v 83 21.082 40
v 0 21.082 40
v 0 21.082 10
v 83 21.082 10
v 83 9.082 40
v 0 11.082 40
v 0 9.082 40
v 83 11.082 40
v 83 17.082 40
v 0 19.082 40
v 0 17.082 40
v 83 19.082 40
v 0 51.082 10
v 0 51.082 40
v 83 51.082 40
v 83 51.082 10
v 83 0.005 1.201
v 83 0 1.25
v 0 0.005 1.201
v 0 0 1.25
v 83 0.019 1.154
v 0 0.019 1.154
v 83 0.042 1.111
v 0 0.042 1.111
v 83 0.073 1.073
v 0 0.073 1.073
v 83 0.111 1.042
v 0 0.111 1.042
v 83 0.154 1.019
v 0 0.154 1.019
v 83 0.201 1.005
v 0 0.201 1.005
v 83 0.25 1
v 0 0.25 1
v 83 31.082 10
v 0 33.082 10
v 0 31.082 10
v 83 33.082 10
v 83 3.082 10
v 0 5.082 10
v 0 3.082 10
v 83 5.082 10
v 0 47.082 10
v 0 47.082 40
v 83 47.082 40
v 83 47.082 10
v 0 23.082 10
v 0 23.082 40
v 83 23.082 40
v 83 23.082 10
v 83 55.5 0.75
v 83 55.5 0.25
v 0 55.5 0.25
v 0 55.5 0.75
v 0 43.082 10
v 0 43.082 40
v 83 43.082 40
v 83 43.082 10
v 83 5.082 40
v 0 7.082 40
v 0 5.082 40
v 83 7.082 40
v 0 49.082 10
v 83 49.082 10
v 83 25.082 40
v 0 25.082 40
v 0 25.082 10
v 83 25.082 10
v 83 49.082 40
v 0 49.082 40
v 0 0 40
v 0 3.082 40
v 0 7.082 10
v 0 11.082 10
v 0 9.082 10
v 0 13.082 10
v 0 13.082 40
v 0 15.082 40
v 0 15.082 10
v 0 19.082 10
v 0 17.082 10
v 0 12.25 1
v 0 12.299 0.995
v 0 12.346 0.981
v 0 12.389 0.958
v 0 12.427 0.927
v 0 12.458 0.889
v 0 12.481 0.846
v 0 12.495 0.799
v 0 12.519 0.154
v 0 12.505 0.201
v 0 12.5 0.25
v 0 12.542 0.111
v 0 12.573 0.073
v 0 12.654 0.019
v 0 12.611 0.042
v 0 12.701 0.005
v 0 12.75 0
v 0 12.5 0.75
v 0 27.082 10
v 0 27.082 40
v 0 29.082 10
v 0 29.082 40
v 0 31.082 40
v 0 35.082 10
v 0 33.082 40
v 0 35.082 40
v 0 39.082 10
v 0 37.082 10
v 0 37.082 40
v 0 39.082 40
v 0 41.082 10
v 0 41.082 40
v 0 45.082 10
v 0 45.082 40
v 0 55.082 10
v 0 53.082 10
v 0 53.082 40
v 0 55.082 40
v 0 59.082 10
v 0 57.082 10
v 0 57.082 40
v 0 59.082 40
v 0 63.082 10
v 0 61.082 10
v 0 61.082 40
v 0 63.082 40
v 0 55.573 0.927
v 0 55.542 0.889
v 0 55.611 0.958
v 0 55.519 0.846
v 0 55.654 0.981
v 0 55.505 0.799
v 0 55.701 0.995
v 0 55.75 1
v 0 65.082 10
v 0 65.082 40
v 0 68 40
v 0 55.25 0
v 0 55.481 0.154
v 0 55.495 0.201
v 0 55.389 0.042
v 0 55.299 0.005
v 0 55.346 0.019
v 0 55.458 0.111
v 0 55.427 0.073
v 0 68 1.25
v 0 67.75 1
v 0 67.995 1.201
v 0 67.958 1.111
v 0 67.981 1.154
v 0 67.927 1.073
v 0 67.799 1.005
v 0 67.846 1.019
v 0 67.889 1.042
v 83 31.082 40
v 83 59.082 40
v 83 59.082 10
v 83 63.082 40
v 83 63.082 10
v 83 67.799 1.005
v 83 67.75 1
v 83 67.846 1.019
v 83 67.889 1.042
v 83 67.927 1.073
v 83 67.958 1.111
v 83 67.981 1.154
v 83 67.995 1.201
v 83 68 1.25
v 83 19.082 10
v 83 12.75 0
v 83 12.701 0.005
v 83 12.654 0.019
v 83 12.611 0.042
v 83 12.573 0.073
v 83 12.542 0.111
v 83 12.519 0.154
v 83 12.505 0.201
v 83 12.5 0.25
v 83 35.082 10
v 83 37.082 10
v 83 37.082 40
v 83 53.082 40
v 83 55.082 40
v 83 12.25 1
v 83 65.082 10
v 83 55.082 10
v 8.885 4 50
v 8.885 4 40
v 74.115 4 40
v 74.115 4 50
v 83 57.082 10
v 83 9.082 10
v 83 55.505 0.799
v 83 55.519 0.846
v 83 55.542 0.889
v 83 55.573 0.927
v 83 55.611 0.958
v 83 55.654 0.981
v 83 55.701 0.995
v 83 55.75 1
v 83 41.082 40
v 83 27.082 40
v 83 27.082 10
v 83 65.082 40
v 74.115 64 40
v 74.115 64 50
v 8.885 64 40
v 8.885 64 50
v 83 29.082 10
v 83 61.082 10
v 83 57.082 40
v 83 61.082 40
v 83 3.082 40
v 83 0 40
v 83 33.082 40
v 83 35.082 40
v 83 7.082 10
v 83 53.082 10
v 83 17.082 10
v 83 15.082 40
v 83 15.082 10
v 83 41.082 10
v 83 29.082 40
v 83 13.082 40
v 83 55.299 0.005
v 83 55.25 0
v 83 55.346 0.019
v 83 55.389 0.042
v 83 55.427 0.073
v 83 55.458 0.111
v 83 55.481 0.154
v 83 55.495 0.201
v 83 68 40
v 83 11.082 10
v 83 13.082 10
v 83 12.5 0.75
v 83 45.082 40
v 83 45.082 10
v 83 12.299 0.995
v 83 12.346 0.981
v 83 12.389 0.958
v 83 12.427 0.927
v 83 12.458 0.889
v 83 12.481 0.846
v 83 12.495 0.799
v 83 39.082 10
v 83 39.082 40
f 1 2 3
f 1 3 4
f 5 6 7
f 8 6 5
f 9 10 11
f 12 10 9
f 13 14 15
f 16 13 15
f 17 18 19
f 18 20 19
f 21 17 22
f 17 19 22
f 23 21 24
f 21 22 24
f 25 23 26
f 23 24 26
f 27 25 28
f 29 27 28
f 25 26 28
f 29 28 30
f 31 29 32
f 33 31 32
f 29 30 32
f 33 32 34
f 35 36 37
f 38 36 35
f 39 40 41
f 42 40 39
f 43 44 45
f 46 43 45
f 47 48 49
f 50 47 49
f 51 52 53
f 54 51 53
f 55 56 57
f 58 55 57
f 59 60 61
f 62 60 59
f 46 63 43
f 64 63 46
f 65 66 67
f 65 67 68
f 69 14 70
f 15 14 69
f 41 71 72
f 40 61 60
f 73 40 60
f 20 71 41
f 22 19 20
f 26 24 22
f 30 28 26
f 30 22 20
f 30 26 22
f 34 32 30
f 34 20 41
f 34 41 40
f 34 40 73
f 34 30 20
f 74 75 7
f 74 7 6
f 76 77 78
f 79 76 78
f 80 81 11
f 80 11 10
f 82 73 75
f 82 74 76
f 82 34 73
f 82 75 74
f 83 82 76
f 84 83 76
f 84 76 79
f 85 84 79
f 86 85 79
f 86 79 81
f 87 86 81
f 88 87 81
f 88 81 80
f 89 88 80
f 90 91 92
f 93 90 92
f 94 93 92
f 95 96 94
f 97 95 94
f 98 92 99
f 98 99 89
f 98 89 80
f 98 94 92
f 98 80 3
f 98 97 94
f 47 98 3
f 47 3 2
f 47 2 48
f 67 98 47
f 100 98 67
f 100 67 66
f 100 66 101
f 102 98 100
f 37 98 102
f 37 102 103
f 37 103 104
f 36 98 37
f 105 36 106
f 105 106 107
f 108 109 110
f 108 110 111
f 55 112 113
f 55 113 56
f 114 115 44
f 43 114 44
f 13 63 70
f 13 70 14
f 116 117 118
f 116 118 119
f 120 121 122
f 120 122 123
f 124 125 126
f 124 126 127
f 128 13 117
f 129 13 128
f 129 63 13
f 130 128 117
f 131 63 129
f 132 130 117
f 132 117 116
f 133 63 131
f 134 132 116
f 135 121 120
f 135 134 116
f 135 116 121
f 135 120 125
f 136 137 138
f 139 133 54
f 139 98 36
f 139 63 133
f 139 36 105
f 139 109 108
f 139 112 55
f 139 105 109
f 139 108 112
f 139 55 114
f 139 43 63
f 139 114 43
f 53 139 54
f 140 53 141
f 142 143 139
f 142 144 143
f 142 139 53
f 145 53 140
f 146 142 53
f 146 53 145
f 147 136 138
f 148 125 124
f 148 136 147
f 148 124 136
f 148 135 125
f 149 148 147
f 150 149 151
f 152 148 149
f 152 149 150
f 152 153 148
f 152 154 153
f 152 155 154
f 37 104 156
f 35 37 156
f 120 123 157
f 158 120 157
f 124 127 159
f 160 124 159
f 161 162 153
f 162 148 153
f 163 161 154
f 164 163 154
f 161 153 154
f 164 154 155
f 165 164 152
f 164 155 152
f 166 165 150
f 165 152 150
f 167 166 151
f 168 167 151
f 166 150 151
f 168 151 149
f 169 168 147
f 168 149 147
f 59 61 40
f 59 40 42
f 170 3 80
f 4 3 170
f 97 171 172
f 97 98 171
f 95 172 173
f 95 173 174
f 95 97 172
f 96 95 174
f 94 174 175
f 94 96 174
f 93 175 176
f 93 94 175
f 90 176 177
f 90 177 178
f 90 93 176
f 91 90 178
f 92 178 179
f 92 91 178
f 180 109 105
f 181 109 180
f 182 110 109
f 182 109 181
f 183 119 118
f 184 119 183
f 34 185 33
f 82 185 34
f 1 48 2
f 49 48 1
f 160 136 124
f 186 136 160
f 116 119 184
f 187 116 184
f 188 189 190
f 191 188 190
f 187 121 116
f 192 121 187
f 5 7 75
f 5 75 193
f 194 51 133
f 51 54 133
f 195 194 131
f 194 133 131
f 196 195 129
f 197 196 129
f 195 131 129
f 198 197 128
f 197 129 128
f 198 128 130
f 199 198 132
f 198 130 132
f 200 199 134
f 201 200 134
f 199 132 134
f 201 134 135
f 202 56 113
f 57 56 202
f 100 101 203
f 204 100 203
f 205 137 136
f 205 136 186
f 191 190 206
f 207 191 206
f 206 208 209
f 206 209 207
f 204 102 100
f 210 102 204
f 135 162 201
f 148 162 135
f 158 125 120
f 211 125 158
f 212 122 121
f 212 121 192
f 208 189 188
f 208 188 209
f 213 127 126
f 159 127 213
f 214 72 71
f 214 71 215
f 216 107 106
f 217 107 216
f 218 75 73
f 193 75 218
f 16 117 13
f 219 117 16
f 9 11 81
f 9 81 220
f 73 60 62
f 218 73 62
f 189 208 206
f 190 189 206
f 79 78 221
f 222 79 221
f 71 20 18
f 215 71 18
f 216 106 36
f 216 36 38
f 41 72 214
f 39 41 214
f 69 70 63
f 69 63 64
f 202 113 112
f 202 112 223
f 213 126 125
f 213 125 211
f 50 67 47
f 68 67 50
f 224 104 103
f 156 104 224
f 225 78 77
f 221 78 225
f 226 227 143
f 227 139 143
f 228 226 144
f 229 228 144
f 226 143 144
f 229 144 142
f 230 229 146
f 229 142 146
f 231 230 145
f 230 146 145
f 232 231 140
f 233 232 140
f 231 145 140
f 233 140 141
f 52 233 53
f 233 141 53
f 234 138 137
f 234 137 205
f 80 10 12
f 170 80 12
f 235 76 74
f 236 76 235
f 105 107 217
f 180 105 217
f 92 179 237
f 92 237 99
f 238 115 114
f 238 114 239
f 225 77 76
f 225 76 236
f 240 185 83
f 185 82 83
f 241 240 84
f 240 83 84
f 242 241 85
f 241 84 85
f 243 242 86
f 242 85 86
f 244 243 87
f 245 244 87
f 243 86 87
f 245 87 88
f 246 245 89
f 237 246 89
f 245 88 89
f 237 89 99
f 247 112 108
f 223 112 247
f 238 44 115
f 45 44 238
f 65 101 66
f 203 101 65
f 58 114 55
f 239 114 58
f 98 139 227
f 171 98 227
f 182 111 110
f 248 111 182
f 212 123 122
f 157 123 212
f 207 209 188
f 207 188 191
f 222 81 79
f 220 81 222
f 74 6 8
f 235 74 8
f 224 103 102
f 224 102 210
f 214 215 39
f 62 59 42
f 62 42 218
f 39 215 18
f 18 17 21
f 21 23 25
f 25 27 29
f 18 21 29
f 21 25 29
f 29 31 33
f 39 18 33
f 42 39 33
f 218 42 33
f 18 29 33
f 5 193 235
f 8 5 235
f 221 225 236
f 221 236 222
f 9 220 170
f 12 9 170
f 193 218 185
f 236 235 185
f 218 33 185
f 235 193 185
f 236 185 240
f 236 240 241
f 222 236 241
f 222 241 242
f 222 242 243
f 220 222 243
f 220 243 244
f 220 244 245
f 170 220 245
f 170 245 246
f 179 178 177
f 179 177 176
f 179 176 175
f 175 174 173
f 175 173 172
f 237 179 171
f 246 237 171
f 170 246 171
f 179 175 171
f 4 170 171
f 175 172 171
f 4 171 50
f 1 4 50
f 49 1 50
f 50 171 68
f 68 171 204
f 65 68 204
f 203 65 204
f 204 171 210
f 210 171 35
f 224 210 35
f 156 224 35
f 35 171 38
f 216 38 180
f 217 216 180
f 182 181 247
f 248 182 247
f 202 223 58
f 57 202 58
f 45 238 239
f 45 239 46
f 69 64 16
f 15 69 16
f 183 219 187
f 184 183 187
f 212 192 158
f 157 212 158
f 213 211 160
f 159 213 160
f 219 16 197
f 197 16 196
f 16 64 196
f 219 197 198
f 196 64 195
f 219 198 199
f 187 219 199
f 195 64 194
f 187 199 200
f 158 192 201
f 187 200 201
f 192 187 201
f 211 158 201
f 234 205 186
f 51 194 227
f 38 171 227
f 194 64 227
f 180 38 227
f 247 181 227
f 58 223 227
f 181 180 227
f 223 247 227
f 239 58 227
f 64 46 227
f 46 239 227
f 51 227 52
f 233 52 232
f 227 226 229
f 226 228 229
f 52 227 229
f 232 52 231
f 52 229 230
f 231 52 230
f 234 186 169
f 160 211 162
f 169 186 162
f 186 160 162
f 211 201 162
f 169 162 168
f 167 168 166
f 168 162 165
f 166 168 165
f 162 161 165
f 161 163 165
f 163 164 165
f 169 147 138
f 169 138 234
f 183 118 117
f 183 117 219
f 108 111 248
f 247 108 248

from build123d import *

# Parameters (mm, degrees)
SKETCH1_W           = 83
SKETCH1_H           = 68
BOSS_EXTRUDE1_DEPTH = 40
SKETCH2_W           = 65.230257998
SKETCH2_H           = 60
BOSS_EXTRUDE2_DEPTH = 10
SKETCH3_W           = 83
SKETCH3_H           = 2
CUT_EXTRUDE1_DEPTH  = 30
SKETCH4_W           = 83
SKETCH4_H           = 12.5
CUT_EXTRUDE2_DEPTH  = 1
FILLET1_R           = 0.25


with BuildPart() as part:
    # Sketch1 → Boss-Extrude1 (new body)
    with BuildSketch(Plane.XY):
        with Locations((41.5, 34)):
            Rectangle(SKETCH1_W, SKETCH1_H)
    extrude(amount=BOSS_EXTRUDE1_DEPTH)

    # Sketch3 → Cut-Extrude1 (cut)
    with BuildSketch(Plane.XY.offset(40)):
        with Locations((41.5, 64.081825925)):
            Rectangle(SKETCH3_W, SKETCH3_H)
        with Locations((41.5, 60.081825925)):
            Rectangle(SKETCH3_W, SKETCH3_H)
        with Locations((41.5, 56.081825925)):
            Rectangle(SKETCH3_W, SKETCH3_H)
        with Locations((41.5, 52.081825925)):
            Rectangle(SKETCH3_W, SKETCH3_H)
        with Locations((41.5, 48.081825925)):
            Rectangle(SKETCH3_W, SKETCH3_H)
        with Locations((41.5, 44.081825925)):
            Rectangle(SKETCH3_W, SKETCH3_H)
        with Locations((41.5, 40.081825925)):
            Rectangle(SKETCH3_W, SKETCH3_H)
        with Locations((41.5, 36.081825925)):
            Rectangle(SKETCH3_W, SKETCH3_H)
        with Locations((41.5, 32.081825925)):
            Rectangle(SKETCH3_W, SKETCH3_H)
        with Locations((41.5, 28.081825925)):
            Rectangle(SKETCH3_W, SKETCH3_H)
        with Locations((41.5, 24.081825925)):
            Rectangle(SKETCH3_W, SKETCH3_H)
        with Locations((41.5, 20.081825925)):
            Rectangle(SKETCH3_W, SKETCH3_H)
        with Locations((41.5, 16.081825925)):
            Rectangle(SKETCH3_W, SKETCH3_H)
        with Locations((41.5, 12.081825925)):
            Rectangle(SKETCH3_W, SKETCH3_H)
        with Locations((41.5, 8.081825925)):
            Rectangle(SKETCH3_W, SKETCH3_H)
        with Locations((41.5, 4.081825925)):
            Rectangle(SKETCH3_W, SKETCH3_H)
    extrude(amount=-CUT_EXTRUDE1_DEPTH, mode=Mode.SUBTRACT)

    # Sketch4 → Cut-Extrude2 (cut)
    with BuildSketch(Plane(origin=(0, 0, 0), x_dir=(-1, 0, 0), z_dir=(0, 0, -1))):
        with Locations((-41.5, 61.75)):
            Rectangle(SKETCH4_W, SKETCH4_H)
        with Locations((-41.5, 6.25)):
            Rectangle(SKETCH4_W, SKETCH4_H)
    extrude(amount=-CUT_EXTRUDE2_DEPTH, mode=Mode.SUBTRACT)

    # Fillet1
    fillet1_edges = [part.edges().sort_by_distance(p)[0] for p in [
        (41.5, 55.5, 0),
        (41.5, 68, 1),
        (41.5, 55.5, 1),
        (41.5, 12.5, 0),
        (41.5, 0, 1),
        (41.5, 12.5, 1),
    ]]
    fillet(fillet1_edges, radius=FILLET1_R)


with BuildPart() as body_2:
    # Sketch2 → Boss-Extrude2 (new body)
    with BuildSketch(Plane.XY.offset(40)):
        with Locations((41.5, 34)):
            Rectangle(SKETCH2_W, SKETCH2_H)
    extrude(amount=BOSS_EXTRUDE2_DEPTH)


solid = Compound([part.part, body_2.part])
